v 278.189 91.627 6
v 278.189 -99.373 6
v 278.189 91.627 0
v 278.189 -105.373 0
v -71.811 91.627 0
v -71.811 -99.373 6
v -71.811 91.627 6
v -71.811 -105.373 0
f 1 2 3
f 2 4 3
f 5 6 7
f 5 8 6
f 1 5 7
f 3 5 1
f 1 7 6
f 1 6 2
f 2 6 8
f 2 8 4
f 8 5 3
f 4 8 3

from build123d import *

# Parameters (mm, degrees)
F0_W     = 350
F0_H     = 200
F1_DEPTH = 6
F2_SIZE  = 5.99999
F3_DEPTH = 3


# Not quite as in the source:
# - a fillet or chamfer is up to 0.001 mm smaller than in the source, because OpenCascade refuses the exact size


with BuildPart() as f1:
    # F0 (on Top) → F1 (new body)
    with BuildSketch(Plane.XY):
        with Locations((103.189206589, -5.372708199)):
            Rectangle(F0_W, F0_H)
    extrude(amount=F1_DEPTH)

    # F2 (size 6 in the source; OpenCascade refuses exactly that, so slightly less here)
    f2_edges = [f1.edges().sort_by_distance(p)[0] for p in [
        (103.189207, -105.372708, 6),
    ]]
    chamfer(f2_edges, length=F2_SIZE)

    # F3 (cut): a face of the model
    f3_faces = [f1.faces().sort_by_distance(p)[0] for p in [
        (103.189206589, 94.627291801, 3),
    ]]
    extrude(f3_faces, amount=-F3_DEPTH, mode=Mode.SUBTRACT)


solid = f1.part
